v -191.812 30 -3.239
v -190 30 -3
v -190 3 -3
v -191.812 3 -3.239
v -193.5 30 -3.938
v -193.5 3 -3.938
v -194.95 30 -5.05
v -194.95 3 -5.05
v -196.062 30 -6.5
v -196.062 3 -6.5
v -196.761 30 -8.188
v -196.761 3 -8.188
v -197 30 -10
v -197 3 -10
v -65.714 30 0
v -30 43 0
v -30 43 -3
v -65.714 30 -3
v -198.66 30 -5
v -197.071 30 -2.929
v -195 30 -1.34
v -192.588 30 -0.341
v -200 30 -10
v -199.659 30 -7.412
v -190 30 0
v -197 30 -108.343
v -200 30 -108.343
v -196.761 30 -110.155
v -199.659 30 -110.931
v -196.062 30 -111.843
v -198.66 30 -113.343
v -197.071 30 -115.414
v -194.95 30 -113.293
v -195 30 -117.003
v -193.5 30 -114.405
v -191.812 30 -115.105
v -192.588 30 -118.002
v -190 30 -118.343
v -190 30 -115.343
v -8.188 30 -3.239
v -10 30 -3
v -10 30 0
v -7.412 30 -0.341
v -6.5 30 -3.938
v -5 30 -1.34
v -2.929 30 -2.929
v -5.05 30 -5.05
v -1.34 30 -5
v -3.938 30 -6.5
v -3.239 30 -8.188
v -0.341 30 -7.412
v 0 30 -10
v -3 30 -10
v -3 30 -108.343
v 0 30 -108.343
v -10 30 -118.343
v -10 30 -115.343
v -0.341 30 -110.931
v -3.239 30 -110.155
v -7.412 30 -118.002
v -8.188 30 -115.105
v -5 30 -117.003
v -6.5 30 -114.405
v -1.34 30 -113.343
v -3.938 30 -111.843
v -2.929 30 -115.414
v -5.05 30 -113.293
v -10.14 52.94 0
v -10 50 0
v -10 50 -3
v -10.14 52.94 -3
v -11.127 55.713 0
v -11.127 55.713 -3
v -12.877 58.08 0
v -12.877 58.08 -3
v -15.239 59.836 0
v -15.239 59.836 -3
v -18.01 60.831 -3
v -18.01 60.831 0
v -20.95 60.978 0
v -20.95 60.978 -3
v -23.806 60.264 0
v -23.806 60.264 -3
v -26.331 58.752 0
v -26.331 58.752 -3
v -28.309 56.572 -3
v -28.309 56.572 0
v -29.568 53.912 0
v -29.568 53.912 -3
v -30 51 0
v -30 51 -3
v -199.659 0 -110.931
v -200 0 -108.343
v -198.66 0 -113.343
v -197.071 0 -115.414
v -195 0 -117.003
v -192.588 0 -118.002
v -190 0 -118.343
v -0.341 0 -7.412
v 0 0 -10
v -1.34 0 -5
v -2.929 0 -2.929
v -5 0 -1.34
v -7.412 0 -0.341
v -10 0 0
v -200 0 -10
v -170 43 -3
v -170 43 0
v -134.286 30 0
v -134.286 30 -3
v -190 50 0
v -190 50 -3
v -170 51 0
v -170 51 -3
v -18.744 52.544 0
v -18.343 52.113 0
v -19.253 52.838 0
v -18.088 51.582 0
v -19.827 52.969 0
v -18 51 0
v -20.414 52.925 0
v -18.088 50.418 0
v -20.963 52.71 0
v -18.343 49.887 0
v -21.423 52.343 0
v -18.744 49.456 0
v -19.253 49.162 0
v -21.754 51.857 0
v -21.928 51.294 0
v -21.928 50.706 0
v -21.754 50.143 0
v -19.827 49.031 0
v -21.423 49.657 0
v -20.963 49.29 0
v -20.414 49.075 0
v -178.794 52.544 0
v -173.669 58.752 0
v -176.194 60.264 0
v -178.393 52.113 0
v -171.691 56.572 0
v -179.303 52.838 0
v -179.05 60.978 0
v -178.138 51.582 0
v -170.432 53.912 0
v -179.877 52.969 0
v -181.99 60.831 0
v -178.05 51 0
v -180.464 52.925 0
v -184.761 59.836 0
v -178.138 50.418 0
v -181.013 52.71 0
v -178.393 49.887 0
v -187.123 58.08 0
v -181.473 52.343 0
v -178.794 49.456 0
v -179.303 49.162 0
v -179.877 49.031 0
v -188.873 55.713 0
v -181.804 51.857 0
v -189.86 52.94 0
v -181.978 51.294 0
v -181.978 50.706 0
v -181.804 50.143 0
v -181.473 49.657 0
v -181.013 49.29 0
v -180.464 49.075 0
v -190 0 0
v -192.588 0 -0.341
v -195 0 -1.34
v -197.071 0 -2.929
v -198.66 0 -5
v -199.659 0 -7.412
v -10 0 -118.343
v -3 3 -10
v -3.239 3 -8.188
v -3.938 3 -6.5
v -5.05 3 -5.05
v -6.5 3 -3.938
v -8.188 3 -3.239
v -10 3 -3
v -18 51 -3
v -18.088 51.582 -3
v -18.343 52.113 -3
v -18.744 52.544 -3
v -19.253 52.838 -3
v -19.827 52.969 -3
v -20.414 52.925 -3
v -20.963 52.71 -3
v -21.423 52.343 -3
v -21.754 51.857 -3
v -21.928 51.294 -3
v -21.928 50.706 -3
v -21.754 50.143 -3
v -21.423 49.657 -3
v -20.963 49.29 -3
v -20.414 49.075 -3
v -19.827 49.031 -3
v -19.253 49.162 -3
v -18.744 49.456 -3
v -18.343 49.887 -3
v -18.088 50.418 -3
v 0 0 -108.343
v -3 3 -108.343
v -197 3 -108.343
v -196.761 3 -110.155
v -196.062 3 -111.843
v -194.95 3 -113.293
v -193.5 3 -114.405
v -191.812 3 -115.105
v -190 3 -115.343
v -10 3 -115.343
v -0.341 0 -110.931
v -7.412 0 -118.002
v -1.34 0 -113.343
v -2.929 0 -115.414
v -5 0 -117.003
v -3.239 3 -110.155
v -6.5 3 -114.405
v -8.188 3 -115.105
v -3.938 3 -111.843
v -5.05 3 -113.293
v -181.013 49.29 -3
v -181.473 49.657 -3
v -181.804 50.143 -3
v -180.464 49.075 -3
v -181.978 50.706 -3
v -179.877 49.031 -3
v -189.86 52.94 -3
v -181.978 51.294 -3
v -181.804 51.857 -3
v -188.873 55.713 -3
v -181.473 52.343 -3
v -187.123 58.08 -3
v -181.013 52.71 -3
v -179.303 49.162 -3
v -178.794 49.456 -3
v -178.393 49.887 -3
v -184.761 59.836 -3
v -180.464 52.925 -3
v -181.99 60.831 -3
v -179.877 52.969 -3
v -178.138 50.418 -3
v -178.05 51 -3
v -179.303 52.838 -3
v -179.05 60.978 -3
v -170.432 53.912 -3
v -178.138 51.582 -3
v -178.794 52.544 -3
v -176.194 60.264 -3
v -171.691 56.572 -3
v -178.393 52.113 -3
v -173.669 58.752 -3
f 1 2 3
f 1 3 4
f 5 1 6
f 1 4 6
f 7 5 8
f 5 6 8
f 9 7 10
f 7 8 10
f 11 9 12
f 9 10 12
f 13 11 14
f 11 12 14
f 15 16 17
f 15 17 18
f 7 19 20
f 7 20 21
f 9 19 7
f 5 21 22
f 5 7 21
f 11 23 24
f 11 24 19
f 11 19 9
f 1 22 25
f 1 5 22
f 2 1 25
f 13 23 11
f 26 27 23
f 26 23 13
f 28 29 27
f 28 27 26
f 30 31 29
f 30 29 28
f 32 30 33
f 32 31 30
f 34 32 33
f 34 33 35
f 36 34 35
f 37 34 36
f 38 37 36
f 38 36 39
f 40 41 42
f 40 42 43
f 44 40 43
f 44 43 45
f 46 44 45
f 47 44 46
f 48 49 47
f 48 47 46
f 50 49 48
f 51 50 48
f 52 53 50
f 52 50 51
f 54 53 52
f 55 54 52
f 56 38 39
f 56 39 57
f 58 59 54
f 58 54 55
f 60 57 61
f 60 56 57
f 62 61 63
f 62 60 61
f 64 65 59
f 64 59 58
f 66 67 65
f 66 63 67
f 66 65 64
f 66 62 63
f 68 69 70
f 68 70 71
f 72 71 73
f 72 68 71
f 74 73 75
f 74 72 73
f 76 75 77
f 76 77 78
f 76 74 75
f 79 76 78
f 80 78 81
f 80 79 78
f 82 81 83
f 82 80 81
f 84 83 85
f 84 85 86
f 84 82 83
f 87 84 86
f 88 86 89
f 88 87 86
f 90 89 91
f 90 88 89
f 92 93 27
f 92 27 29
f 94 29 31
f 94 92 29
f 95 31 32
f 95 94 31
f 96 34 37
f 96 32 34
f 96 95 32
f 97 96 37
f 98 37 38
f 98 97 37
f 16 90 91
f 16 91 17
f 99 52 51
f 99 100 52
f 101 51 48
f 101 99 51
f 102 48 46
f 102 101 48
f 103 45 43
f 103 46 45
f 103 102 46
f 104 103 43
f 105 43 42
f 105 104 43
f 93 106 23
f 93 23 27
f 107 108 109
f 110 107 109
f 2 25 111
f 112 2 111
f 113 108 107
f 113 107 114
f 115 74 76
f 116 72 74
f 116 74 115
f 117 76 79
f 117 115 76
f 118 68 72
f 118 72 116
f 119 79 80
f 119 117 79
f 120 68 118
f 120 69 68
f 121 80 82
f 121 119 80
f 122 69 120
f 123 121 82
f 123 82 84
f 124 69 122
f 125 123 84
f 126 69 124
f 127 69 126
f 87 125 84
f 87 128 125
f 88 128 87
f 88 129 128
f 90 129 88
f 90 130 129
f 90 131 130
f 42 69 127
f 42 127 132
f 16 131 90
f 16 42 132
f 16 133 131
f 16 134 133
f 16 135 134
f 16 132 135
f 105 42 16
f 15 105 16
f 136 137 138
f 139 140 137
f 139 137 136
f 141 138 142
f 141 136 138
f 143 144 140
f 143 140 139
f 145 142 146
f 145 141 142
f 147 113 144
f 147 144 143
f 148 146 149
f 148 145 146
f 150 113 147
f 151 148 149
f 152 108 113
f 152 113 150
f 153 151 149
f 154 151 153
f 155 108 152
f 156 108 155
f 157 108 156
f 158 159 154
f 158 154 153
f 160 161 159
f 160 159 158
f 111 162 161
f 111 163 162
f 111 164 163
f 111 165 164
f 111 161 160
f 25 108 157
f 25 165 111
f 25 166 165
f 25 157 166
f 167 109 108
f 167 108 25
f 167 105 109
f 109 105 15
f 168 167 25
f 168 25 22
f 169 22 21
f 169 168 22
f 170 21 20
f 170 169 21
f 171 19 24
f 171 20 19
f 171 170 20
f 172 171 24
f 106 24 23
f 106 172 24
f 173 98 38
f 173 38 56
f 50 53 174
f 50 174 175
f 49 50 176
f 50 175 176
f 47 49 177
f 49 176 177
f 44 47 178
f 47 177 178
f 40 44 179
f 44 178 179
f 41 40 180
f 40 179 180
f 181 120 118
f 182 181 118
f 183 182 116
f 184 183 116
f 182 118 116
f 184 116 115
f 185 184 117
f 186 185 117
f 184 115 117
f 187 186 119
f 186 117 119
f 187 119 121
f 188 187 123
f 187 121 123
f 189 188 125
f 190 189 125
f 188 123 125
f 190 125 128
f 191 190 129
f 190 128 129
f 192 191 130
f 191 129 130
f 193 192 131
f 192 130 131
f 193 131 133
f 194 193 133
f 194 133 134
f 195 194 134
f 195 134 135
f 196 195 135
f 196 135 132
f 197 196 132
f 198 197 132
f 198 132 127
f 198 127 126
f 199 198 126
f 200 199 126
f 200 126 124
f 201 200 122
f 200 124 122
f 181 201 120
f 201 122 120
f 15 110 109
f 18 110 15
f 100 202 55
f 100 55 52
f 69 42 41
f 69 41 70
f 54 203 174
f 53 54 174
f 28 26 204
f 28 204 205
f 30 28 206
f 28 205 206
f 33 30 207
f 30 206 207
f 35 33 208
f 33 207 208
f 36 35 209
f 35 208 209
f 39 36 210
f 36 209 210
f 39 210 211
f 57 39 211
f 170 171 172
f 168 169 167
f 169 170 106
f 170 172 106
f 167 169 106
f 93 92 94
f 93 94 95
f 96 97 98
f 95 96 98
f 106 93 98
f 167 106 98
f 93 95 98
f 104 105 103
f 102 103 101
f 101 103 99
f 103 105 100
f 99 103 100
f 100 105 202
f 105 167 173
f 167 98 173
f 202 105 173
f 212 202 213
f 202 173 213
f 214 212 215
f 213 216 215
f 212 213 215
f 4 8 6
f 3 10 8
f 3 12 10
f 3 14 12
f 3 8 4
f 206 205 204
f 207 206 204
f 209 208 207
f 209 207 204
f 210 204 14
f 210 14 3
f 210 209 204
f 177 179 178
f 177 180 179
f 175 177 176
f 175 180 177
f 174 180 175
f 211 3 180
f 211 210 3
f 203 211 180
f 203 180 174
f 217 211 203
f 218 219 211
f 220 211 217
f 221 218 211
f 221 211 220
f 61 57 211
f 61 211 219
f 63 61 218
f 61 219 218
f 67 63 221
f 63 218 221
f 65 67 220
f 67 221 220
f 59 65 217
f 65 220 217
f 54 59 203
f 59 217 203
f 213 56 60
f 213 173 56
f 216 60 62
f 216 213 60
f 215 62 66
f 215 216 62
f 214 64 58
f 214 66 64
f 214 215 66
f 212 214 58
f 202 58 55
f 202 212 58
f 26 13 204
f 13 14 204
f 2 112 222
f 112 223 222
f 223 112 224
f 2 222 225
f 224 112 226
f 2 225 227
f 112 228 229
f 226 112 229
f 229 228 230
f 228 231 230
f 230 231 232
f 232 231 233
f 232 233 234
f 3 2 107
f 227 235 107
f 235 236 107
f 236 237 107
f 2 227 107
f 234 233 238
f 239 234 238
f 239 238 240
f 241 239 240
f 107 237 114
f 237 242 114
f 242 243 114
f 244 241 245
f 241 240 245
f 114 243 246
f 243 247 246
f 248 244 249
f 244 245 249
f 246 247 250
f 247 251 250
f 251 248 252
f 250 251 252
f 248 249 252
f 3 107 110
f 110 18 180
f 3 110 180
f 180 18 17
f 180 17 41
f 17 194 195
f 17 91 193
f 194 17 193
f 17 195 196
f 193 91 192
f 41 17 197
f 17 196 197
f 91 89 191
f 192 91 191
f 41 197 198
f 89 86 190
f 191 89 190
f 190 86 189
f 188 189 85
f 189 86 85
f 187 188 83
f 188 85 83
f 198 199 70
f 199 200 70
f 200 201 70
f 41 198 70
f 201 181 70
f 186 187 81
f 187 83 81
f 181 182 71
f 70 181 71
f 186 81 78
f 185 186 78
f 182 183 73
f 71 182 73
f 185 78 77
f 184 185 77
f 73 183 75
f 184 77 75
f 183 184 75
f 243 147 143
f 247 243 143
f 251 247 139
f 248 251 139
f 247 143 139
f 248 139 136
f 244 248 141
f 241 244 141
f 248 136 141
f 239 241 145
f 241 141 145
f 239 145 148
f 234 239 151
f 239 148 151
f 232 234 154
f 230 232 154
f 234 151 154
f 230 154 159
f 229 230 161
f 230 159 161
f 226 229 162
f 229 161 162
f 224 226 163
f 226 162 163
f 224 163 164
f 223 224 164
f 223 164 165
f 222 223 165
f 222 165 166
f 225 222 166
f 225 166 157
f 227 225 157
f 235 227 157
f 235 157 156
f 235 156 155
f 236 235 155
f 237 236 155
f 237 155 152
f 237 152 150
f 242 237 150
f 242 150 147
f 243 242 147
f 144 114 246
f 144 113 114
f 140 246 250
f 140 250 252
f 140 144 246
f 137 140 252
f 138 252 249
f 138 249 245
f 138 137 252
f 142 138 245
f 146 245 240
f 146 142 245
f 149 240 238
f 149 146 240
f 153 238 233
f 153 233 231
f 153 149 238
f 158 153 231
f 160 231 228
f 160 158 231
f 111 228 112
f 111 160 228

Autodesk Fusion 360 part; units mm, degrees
sketch "Sketch1" plane through (0, 0, 0) normal (0, 1, 0) x (1, 0, 0)
  line L0 (-190, 118.3432) -> (-10, 118.3432)
  line L1 (0, 108.3432) -> (0, 10)
  line L2 (-10, 0) -> (-190, 0)
  line L3 (-200, 10) -> (-200, 108.3432)
  arc A0 (-190, 118.3432) -> (-200, 108.3432) centre (-190, 108.3432) ccw
  arc A1 (-200, 10) -> (-190, 0) centre (-190, 10) ccw
  arc A2 (-10, 0) -> (0, 10) centre (-10, 10) ccw
  arc A3 (0, 108.3432) -> (-10, 118.3432) centre (-10, 108.3432) ccw
  arc A4 (-3, 108.3432) -> (-10, 115.3432) centre (-10, 108.3432) ccw
  line L4 (-190, 115.3432) -> (-10, 115.3432)
  arc A5 (-190, 115.3432) -> (-197, 108.3432) centre (-190, 108.3432) ccw
  line L5 (-197, 10) -> (-197, 108.3432)
  arc A6 (-197, 10) -> (-190, 3) centre (-190, 10) ccw
  line L6 (-10, 3) -> (-190, 3)
  arc A7 (-10, 3) -> (-3, 10) centre (-10, 10) ccw
  line L7 (-3, 108.3432) -> (-3, 10)
  dimension "d3" = 200
  dimension "d4" = 118.3432
  dimension "d6" = 10
  dimension "d7" = 10
  dimension "d8" = 10
  dimension "d9" = 10
  dimension "d15" = 3
extrude "Extrude2" add sketch "Sketch1" along normal blind 3 contours L0 L1 L2 L3 A0 A1 A2 A3 | A4 L4 A5 L5 A6 L6 A7 L7 makes body 1
extrude "Extrude3" add sketch "Sketch1" along normal blind 30 separate body makes body 2
combine "Combine1" operation add target body 2 tool bodies 1
sketch "Sketch2" plane through (0, 0, 0) normal (0, 0, 1) x (1, 0, 0)
  line L0 (-10, 0) -> (-10, 30)
  line L1 (-10, 30) -> (-190, 30)
  line L2 (-190, 30) -> (-190, 0)
  line L3 (-190, 0) -> (-10, 0)
  line L4 (-100, 30) -> (-100, 0)
  line L5 (-10, 30) -> (-10, 50)
  line L6 (-30, 50) -> (-30, 43)
  line L7 (-30, 43) -> (-65.7143, 30)
  line L8 (-10, 30) -> (-65.7143, 30)
  line L9 (-30, 50) -> (-30, 51)
  arc A0 (-10, 50) -> (-30, 51) centre (-19.975, 51) ccw
  circle A1 centre (-19.975, 51) radius 1.975
  line L10 (-170, 43) -> (-134.2857, 30)
  line L11 (-190, 30) -> (-134.2857, 30)
  line L12 (-190, 30) -> (-190, 50)
  arc A2 (-170, 51) -> (-190, 50) centre (-180.025, 51) ccw
  line L13 (-170, 50) -> (-170, 43)
  line L14 (-170, 50) -> (-170, 51)
  circle A3 centre (-180.025, 51) radius 1.975
extrude "Extrude4" add sketch "Sketch2" against normal blind 3 contours L1 L5 L6 L7 L8 L9 A0 | L1 L10 L11 L12 A2 L13 L14 bodies 2
equation "leveys = 200 mm"
equation "d3 = leveys"
equation "d4 = leveys / 1.69"
equation "fillet = 10 mm"
equation "d6 = fillet"
equation "d7 = fillet"
equation "d8 = fillet"
equation "d9 = fillet"
equation "paksuus = 30 mm"
equation "pohjanpaksuus = 3 mm"
equation "reuna = 3 mm"
equation "d15 = reuna"
equation "d16 = pohjanpaksuus"
equation "d18 = paksuus"
equation "d20 = -reuna"
